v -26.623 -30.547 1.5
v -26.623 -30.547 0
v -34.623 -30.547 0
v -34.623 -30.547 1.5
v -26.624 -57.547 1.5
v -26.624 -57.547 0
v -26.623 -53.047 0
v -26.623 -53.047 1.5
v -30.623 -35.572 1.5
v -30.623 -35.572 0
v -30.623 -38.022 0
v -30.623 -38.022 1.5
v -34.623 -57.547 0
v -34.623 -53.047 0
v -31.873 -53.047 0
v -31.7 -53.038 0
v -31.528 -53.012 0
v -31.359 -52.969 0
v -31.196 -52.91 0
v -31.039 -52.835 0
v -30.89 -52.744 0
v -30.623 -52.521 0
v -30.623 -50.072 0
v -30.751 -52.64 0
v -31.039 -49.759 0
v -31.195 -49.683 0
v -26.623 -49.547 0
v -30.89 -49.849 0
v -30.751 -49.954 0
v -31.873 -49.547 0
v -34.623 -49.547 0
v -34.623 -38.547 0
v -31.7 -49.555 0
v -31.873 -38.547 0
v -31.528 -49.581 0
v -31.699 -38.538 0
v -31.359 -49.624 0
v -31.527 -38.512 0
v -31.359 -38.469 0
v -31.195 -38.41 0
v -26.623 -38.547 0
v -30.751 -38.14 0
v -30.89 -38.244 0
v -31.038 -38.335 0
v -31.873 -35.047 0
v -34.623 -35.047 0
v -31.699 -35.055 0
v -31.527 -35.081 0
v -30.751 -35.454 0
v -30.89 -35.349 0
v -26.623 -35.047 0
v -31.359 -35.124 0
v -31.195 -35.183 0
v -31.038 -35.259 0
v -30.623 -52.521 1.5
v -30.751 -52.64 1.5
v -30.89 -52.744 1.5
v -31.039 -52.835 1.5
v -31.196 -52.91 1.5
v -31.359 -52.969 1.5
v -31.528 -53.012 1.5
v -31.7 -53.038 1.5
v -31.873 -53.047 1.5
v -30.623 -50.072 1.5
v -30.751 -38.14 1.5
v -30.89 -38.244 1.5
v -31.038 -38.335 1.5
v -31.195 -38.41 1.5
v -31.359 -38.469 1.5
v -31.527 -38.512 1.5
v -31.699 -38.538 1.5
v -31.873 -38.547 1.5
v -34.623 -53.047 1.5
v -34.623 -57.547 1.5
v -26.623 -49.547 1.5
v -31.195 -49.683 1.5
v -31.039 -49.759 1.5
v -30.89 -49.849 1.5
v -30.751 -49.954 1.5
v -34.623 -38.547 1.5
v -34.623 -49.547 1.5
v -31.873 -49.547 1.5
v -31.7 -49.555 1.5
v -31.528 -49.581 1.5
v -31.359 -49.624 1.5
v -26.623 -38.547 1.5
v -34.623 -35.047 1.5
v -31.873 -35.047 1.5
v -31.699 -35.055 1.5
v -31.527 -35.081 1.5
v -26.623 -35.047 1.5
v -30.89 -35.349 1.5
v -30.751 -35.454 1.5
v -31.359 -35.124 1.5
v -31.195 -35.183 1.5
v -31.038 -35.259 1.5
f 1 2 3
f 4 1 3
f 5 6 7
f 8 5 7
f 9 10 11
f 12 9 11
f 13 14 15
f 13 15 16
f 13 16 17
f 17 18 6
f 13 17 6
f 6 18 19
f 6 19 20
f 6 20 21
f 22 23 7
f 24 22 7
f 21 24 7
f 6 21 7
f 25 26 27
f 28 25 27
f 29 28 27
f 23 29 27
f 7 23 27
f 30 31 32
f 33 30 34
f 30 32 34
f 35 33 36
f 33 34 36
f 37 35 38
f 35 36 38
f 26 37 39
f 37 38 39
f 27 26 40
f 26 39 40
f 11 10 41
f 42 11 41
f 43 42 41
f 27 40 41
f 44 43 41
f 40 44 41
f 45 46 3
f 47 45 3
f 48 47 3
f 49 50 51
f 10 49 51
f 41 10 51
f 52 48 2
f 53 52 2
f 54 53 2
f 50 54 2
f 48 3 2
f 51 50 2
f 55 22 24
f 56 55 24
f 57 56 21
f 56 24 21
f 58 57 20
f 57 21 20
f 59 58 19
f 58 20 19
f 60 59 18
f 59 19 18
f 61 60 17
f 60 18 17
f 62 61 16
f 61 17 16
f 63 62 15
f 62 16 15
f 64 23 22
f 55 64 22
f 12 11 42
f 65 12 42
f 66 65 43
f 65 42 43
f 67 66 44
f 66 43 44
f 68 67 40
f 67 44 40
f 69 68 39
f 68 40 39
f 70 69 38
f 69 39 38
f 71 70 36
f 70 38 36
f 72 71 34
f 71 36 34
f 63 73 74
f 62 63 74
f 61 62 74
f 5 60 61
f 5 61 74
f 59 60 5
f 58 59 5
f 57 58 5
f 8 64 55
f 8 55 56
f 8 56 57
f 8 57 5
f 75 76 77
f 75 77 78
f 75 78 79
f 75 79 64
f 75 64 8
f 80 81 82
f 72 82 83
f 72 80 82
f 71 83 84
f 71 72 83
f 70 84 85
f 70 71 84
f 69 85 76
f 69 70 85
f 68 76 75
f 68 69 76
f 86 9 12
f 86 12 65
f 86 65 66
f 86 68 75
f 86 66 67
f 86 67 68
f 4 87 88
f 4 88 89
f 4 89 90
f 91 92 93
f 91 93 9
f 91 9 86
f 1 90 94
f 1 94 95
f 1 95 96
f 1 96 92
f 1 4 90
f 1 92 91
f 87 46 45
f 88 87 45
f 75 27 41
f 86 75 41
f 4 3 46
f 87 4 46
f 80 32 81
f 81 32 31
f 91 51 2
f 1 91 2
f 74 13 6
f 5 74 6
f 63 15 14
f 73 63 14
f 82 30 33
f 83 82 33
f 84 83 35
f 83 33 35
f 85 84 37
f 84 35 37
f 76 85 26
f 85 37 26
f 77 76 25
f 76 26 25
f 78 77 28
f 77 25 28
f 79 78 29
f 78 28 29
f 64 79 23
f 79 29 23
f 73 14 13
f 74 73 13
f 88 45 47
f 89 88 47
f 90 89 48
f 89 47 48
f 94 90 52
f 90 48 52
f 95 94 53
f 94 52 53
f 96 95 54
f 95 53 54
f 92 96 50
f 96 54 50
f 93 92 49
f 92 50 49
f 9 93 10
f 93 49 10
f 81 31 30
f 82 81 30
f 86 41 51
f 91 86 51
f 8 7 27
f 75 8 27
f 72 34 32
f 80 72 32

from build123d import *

# Parameters (mm, degrees)
F1_DEPTH = 1.5


# Not quite as in the source:
# - ends of sketch curves that miss each other by under 0.0002 mm in the source are joined


with BuildPart() as f1:
    # F0 (on Top) → F1 (new body)
    with BuildSketch(Plane.XY):
        Polygon((-34.6231374532, -30.5467036664), (-34.6231374532, -35.0467036664), (-31.8731374532, -35.0467036664), (-30.6230945961, -35.0467036664), (-26.6231374532, -35.0467036664), (-26.6231374532, -30.5467036664), (-30.6230517389, -30.5467036664), align=None)
        with BuildLine():
            Line((-30.6230945961, -35.0467036664), (-31.8731374532, -35.0467036664))
            ThreePointArc((-31.8731374532, -35.0467036664), (-31.1952175422, -35.1833094776), (-30.6231474562, -35.5718611088))
            Line((-30.6231474562, -35.5718611088), (-30.6230945961, -35.0467036664))
        make_face()
        with BuildLine():
            Line((-26.6231374532, -35.0467036664), (-30.6230945961, -35.0467036664))
            Line((-30.6230945961, -35.0467036664), (-30.6231474562, -35.5718611088))
            ThreePointArc((-30.6231474562, -35.5718611088), (-30.1230517371, -36.796737), (-30.6231941178, -38.0215938389))
            Line((-30.6231941178, -38.0215938389), (-30.6232041199, -38.5467036666))
            Line((-30.6232041199, -38.5467036666), (-26.6232041199, -38.5467036666))
            Line((-26.6232041199, -38.5467036666), (-26.6231374532, -35.0467036664))
        make_face()
        with BuildLine():
            ThreePointArc((-30.6231941178, -38.0215938389), (-30.1230517371, -36.796737), (-30.6231474562, -35.5718611088))
            Line((-30.6231474562, -35.5718611088), (-30.6231941178, -38.0215938389))
        make_face()
        with BuildLine():
            Line((-30.6232041199, -38.5467036666), (-30.6231941178, -38.0215938389))
            ThreePointArc((-30.6231941178, -38.0215938389), (-31.1951692504, -38.410077566), (-31.8729660246, -38.5467036666))
            Line((-31.8729660246, -38.5467036666), (-30.6232041199, -38.5467036666))
        make_face()
        Polygon((-26.6234136437, -49.5467036666), (-26.6232041199, -38.5467036666), (-30.6232041199, -38.5467036666), (-30.6234136437, -49.5467036665), align=None)
        Polygon((-30.6234136437, -49.5467036665), (-30.6232041199, -38.5467036666), (-31.8729660246, -38.5467036666), (-34.6229279294, -38.5467036666), (-34.6231374532, -49.5467036664), (-31.8734136439, -49.5467036665), align=None)
        with BuildLine():
            Line((-26.6234803104, -53.0467036664), (-26.6234136437, -49.5467036666))
            Line((-26.6234136437, -49.5467036666), (-30.6234136437, -49.5467036665))
            Line((-30.6234136437, -49.5467036665), (-30.623423649, -50.0719826043))
            ThreePointArc((-30.623423649, -50.0719826043), (-30.1234469771, -51.2967369998), (-30.6234703059, -52.5214723478))
            Line((-30.6234703059, -52.5214723478), (-30.6234803104, -53.0467036664))
            Line((-30.6234803104, -53.0467036664), (-26.6234803104, -53.0467036664))
        make_face()
        with BuildLine():
            Line((-30.623423649, -50.0719826043), (-30.6234136437, -49.5467036665))
            Line((-30.6234136437, -49.5467036665), (-31.8734136439, -49.5467036665))
            ThreePointArc((-31.8734136439, -49.5467036665), (-31.1954794965, -49.6833654824), (-30.623423649, -50.0719826043))
        make_face()
        Polygon((-26.6235660246, -57.5467036664), (-26.6234803104, -53.0467036664), (-30.6234803104, -53.0467036664), (-31.8734803104, -53.0467036664), (-34.6234803104, -53.0467036664), (-34.6234803104, -57.5467036664), align=None)
        with BuildLine():
            ThreePointArc((-30.6234703059, -52.5214723478), (-30.1234469771, -51.2967369998), (-30.623423649, -50.0719826043))
            Line((-30.623423649, -50.0719826043), (-30.6234703059, -52.5214723478))
        make_face()
        with BuildLine():
            Line((-31.8734803104, -53.0467036664), (-30.6234803104, -53.0467036664))
            Line((-30.6234803104, -53.0467036664), (-30.6234703059, -52.5214723478))
            ThreePointArc((-30.6234703059, -52.5214723478), (-31.1955409574, -52.9100676767), (-31.8734803104, -53.0467036665))
        make_face()
    extrude(amount=F1_DEPTH)


solid = f1.part
